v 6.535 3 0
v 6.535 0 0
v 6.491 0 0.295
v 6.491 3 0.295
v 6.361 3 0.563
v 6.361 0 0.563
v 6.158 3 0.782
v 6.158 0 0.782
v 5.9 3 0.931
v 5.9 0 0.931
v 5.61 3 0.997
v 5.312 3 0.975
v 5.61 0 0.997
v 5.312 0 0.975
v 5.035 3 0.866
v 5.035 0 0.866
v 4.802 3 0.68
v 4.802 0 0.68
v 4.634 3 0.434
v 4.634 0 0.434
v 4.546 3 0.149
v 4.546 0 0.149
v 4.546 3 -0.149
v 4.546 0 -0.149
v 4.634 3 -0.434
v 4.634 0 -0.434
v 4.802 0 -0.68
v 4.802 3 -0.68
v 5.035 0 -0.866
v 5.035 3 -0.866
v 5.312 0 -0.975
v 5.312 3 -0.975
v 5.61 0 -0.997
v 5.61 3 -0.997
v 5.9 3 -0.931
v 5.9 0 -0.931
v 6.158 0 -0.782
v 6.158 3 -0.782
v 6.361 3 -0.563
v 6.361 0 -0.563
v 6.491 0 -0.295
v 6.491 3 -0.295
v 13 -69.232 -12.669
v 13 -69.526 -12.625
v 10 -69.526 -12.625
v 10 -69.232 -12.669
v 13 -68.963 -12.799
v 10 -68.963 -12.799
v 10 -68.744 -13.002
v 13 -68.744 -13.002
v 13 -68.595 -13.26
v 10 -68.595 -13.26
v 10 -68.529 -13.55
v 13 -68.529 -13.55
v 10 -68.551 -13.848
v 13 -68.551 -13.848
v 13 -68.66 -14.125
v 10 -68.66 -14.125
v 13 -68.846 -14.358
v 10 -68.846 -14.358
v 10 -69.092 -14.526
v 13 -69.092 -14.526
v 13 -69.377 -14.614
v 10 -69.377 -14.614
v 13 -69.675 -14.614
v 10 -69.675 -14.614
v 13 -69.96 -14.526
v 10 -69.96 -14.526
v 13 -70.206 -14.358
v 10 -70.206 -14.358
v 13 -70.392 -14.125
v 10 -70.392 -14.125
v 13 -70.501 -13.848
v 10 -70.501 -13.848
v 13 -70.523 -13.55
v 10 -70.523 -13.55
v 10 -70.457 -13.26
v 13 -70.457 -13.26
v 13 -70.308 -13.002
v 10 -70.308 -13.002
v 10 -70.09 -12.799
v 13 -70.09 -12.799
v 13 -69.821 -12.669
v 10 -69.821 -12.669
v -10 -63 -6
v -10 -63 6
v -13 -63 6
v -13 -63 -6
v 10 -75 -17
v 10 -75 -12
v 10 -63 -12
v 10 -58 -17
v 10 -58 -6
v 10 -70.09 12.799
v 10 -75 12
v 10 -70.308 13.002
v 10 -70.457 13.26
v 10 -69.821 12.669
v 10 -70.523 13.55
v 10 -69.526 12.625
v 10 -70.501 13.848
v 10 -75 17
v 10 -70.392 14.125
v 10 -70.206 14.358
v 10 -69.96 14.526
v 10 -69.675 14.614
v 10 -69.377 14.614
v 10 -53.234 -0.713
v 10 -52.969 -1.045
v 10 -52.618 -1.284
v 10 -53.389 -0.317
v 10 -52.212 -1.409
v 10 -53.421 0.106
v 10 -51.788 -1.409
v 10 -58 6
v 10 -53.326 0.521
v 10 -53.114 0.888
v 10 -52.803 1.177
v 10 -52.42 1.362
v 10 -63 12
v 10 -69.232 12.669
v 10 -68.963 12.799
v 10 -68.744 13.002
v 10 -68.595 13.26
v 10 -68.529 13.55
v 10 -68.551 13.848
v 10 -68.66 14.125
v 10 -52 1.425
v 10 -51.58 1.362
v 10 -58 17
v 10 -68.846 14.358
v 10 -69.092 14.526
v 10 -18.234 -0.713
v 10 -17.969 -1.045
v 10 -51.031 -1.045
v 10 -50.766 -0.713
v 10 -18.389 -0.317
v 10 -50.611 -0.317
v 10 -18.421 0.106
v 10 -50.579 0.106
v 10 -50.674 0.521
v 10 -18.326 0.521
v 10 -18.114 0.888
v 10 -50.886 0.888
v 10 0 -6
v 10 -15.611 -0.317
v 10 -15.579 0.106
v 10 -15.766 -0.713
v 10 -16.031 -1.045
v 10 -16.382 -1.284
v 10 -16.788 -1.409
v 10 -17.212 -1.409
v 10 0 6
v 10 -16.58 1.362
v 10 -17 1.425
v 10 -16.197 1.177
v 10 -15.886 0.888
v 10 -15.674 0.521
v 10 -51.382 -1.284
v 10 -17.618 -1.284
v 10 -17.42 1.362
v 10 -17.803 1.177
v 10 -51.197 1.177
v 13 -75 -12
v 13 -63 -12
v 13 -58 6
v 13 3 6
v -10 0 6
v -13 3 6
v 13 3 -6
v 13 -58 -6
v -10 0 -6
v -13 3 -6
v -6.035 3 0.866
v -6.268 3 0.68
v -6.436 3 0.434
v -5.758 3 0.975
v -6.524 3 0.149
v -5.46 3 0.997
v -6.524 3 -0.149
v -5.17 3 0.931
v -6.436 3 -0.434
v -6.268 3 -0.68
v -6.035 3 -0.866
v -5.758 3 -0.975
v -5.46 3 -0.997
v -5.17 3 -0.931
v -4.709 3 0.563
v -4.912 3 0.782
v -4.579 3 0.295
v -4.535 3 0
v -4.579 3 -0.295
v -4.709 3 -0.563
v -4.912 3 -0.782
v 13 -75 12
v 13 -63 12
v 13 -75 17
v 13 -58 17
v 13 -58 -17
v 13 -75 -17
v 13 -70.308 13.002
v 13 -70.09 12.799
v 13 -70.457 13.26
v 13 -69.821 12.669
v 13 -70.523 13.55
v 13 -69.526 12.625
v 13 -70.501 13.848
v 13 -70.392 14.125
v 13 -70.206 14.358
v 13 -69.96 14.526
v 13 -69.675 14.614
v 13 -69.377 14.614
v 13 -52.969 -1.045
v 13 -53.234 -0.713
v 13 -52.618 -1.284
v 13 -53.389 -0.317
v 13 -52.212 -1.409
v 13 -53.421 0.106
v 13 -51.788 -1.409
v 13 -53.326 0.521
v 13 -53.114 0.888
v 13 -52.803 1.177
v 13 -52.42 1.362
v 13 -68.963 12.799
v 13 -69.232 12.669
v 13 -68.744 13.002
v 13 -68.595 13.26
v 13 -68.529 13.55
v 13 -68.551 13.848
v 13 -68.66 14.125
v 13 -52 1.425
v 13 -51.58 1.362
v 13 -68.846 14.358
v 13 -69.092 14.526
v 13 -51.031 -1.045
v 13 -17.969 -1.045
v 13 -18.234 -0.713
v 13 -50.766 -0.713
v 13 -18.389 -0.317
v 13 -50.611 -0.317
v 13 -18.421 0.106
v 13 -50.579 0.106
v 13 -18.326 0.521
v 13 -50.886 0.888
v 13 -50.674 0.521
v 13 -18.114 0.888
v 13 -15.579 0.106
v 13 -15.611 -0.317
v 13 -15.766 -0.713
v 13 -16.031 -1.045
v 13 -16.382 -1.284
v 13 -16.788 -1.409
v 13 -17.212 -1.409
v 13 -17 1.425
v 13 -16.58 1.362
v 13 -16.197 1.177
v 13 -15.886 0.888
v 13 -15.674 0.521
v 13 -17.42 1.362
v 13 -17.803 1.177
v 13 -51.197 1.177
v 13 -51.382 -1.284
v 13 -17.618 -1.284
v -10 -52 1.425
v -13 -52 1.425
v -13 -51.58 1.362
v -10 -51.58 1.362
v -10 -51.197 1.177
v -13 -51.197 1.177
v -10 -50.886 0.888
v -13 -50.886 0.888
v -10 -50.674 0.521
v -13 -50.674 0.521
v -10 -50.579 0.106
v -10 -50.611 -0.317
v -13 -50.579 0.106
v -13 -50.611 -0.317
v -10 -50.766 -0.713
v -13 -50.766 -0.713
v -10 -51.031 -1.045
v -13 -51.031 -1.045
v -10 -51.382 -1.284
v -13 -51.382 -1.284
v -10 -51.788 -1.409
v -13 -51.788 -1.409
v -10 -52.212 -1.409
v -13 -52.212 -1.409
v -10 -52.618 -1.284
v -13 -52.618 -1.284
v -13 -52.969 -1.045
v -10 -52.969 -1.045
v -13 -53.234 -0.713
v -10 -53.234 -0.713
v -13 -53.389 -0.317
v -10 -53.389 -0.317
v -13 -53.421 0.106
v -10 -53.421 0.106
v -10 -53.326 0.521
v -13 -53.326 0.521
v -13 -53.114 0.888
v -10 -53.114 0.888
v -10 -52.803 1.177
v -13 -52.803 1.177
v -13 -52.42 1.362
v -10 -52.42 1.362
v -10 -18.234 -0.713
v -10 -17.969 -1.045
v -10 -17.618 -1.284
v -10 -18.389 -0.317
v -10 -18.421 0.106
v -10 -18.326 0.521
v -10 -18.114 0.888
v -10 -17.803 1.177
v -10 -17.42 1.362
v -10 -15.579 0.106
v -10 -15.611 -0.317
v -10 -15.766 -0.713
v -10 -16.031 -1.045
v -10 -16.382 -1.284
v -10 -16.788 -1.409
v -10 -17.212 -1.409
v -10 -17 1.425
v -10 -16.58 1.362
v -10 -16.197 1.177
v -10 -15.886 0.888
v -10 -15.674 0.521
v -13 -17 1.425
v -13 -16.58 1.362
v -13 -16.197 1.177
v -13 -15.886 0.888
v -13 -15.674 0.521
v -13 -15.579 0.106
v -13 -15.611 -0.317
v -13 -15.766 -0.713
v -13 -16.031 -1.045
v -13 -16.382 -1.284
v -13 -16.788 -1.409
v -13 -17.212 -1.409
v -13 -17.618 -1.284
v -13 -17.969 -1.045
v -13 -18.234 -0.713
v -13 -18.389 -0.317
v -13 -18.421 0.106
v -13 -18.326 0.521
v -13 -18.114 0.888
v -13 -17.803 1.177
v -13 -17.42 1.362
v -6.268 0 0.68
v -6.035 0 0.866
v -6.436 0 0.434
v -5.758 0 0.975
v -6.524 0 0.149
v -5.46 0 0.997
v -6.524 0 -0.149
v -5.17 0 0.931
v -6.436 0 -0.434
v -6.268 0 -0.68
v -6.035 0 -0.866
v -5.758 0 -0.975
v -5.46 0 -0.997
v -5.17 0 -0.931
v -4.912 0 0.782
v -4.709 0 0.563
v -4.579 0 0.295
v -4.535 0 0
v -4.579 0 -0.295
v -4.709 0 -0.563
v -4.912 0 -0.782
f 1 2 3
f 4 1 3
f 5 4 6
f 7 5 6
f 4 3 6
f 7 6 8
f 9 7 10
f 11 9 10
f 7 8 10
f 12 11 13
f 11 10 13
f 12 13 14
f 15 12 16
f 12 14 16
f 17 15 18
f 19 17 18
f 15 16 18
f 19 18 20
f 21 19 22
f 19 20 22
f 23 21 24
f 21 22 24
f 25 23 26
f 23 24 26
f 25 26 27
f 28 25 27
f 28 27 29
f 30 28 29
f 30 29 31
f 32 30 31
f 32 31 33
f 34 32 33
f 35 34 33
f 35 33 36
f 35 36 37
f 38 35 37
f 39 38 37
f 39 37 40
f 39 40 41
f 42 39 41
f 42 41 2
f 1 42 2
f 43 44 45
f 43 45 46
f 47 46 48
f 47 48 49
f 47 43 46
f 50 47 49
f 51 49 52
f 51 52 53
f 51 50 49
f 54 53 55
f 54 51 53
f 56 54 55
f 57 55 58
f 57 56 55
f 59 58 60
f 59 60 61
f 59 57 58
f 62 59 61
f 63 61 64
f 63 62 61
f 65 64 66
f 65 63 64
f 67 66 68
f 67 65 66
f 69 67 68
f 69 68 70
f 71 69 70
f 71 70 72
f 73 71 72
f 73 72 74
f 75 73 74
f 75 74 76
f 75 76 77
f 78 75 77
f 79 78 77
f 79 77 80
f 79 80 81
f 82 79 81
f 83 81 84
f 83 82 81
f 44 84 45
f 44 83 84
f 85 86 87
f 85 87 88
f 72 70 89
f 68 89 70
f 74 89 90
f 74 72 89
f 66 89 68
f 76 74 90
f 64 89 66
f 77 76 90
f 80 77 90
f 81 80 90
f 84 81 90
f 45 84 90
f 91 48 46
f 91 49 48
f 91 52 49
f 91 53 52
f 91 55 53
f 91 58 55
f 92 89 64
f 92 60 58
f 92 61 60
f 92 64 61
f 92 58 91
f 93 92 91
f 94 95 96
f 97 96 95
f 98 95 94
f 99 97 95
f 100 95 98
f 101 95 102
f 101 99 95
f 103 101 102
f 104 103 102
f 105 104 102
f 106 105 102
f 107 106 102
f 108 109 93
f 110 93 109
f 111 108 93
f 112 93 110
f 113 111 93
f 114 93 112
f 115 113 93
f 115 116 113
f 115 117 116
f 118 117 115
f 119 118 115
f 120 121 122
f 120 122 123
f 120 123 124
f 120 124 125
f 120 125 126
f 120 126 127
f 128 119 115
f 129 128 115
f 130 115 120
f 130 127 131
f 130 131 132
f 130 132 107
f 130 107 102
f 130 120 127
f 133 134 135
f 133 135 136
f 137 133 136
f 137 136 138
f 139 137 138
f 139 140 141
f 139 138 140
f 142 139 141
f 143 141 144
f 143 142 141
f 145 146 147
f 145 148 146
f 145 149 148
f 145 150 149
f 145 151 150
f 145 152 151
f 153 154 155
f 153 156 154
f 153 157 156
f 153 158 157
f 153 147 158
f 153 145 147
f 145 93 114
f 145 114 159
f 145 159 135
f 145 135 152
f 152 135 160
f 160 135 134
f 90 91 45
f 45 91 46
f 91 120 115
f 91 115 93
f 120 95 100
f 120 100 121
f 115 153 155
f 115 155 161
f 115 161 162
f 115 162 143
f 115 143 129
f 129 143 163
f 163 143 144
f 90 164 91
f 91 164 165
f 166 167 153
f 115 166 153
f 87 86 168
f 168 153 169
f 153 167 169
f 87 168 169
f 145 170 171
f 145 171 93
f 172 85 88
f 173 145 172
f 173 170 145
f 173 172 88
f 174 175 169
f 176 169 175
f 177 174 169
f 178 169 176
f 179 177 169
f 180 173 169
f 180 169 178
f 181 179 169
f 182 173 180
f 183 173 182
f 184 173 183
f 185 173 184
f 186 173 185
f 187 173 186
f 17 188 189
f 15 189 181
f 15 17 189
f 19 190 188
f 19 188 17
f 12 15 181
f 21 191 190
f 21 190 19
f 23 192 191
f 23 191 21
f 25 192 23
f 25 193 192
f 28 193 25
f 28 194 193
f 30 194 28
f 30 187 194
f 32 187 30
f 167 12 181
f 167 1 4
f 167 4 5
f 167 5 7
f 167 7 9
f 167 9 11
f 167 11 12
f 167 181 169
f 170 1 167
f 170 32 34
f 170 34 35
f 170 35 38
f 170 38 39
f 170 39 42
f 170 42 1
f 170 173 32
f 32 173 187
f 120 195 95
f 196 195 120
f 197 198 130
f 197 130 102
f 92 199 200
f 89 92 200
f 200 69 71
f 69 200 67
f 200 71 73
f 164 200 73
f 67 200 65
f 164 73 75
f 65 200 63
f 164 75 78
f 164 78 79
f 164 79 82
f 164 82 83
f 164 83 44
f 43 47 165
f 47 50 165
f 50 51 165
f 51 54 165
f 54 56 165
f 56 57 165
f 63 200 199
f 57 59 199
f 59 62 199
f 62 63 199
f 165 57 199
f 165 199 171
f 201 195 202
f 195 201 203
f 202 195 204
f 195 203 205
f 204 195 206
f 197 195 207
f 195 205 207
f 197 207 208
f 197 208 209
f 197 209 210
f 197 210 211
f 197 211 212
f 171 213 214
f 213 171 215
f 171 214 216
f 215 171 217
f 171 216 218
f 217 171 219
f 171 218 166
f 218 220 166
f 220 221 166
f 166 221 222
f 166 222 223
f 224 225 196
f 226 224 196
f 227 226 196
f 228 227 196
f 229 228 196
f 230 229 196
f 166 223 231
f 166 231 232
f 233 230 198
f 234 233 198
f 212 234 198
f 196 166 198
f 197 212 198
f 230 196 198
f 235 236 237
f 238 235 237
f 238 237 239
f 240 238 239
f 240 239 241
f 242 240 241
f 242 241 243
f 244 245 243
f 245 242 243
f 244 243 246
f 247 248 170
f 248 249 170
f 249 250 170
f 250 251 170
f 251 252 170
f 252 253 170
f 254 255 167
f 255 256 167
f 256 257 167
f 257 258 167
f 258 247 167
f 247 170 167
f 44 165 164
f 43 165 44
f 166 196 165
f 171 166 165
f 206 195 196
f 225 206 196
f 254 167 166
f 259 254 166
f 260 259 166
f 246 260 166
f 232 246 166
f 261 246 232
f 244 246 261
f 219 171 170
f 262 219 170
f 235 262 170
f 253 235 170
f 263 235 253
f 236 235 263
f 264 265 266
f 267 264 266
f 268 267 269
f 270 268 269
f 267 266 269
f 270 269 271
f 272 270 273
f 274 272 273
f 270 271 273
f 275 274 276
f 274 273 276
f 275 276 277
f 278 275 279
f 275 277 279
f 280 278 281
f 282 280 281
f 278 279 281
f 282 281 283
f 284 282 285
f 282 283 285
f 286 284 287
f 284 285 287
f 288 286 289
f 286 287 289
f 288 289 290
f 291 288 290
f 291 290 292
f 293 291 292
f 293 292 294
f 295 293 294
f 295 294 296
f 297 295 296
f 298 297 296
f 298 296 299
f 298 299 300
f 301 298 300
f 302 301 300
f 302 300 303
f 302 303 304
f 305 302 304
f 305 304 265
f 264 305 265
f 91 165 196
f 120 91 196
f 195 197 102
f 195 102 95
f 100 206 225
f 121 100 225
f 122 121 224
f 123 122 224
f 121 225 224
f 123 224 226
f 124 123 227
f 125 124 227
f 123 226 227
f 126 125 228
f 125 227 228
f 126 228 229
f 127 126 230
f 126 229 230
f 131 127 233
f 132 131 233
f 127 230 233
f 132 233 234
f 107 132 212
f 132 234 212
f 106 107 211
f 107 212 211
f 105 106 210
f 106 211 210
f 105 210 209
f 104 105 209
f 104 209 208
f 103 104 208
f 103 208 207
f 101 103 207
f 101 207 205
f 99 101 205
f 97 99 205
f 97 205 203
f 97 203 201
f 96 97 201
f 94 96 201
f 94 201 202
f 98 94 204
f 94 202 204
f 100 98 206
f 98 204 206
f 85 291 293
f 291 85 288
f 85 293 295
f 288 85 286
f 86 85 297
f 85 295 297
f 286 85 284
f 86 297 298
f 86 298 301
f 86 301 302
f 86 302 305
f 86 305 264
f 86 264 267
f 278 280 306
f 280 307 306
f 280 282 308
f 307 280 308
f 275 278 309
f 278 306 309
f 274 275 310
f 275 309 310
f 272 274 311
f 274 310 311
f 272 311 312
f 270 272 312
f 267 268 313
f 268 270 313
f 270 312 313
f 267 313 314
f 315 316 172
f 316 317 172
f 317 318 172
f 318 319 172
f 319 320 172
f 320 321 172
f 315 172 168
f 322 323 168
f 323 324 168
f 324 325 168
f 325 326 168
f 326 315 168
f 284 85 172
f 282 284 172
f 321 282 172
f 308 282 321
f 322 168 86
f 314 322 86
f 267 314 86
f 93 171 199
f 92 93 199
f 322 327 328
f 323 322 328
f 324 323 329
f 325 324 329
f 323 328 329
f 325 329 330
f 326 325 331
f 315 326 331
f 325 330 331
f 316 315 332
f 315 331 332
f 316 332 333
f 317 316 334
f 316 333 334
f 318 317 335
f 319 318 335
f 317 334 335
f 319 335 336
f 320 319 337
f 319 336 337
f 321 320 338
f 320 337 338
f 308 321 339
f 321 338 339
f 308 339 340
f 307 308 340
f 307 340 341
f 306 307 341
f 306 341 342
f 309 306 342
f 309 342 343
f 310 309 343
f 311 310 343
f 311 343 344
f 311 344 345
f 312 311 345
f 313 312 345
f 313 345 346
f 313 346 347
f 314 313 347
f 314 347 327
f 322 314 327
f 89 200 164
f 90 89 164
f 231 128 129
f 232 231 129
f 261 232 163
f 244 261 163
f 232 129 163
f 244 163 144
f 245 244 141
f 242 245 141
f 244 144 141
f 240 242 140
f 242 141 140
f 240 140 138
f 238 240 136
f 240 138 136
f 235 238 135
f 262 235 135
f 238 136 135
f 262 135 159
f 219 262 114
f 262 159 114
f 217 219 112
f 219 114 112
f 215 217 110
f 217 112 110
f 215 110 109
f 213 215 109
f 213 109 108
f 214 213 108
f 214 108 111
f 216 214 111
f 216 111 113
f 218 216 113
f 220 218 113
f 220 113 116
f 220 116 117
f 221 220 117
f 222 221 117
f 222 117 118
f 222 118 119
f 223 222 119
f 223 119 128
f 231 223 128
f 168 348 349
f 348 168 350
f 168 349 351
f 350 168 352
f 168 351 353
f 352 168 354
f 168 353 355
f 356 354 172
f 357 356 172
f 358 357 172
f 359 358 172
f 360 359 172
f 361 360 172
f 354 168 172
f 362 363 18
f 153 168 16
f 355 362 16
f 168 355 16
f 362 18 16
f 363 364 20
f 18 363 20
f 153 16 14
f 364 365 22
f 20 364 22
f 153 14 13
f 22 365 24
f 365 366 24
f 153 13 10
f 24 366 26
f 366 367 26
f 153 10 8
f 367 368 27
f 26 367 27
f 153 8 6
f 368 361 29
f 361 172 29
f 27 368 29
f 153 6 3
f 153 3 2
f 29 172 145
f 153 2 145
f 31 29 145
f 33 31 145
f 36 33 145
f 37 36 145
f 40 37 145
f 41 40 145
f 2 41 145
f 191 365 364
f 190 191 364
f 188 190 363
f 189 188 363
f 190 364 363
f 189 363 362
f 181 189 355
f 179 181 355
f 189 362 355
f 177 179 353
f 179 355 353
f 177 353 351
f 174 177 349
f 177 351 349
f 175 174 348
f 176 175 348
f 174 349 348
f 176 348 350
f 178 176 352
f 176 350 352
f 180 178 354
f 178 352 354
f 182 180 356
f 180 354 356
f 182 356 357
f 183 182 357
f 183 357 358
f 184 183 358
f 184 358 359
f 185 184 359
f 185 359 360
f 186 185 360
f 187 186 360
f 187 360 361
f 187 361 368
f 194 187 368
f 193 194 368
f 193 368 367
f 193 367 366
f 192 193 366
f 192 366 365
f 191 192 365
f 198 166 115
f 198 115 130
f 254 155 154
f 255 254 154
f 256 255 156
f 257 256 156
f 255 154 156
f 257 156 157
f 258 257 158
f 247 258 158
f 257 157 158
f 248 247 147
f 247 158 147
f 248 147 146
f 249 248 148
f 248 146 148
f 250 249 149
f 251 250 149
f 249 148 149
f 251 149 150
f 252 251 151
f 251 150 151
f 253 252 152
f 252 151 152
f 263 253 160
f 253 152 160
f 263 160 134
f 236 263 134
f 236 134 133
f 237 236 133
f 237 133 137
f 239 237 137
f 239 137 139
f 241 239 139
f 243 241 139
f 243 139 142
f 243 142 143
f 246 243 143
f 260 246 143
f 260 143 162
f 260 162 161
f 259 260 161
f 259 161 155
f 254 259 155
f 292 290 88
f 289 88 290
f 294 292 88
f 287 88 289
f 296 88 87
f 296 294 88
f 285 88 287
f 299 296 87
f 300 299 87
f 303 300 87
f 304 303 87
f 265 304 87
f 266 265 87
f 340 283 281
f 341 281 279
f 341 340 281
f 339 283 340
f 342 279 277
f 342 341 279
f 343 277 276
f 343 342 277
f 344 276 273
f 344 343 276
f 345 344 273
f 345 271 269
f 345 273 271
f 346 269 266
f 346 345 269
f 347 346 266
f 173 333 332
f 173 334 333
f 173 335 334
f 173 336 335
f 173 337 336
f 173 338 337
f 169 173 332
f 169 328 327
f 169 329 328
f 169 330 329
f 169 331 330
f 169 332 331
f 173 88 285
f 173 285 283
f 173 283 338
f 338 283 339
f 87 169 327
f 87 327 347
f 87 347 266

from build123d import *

# Parameters (mm, degrees)
SKETCH2_W           = 26
SKETCH2_H           = 12
BOSS_EXTRUDE1_DEPTH = 3
SKETCH3_R           = 1
CUT_EXTRUDE1_DEPTH  = 10
SKETCH4_W           = 3
SKETCH4_H           = 12
BOSS_EXTRUDE2_DEPTH = 75
SKETCH5_R           = 1.425
CUT_EXTRUDE2_DEPTH  = 30
LPATTERN1_COUNT     = 2
LPATTERN1_PITCH     = 35
BOSS_EXTRUDE3_DEPTH = 3
SKETCH7_R           = 1
CUT_EXTRUDE3_DEPTH  = 3
SKETCH8_W           = 12
SKETCH8_H           = 12
CUT_EXTRUDE4_DEPTH  = 27


with BuildPart() as part:
    # Sketch2 → Boss-Extrude1 (new body)
    with BuildSketch(Plane(origin=(0, 0, 0), x_dir=(1, 0, 0), z_dir=(0, 1, 0))):
        Rectangle(SKETCH2_W, SKETCH2_H)
    extrude(amount=BOSS_EXTRUDE1_DEPTH)

    # Sketch3 → Cut-Extrude1 (cut)
    with BuildSketch(Plane.XZ):
        with Locations((-5.535, 0)):
            Circle(SKETCH3_R)
        with Locations((5.535, 0)):
            Circle(SKETCH3_R)
    extrude(amount=-CUT_EXTRUDE1_DEPTH, mode=Mode.SUBTRACT)

    # Sketch4 → Boss-Extrude2 (add)
    with BuildSketch(Plane.XZ):
        with Locations((-11.5, 0)):
            Rectangle(SKETCH4_W, SKETCH4_H)
    boss_extrude2 = extrude(amount=BOSS_EXTRUDE2_DEPTH)

    # Mirror1: Boss-Extrude2 across plane
    add(boss_extrude2.mirror(Plane(origin=(0, 0, 0), x_dir=(0, 0, 1), z_dir=(1, 0, 0))))

    # Sketch5 → Cut-Extrude2 (cut)
    with BuildSketch(Plane.ZY.offset(13)):
        with Locations((0, -17)):
            Circle(SKETCH5_R)
    cut_extrude2 = extrude(amount=-CUT_EXTRUDE2_DEPTH, mode=Mode.SUBTRACT)

    # LPattern1: Cut-Extrude2 ×2
    with Locations(*[(0, -i * LPATTERN1_PITCH, 0) for i in range(1, LPATTERN1_COUNT)]):
        add(cut_extrude2, mode=Mode.SUBTRACT)

    # Sketch6 → Boss-Extrude3 (add)
    with BuildSketch(Plane(origin=(13, 0, 0), x_dir=(0, 0, -1), z_dir=(1, 0, 0))):
        Polygon((-6, -58), (-17, -58), (-17, -63), (-17, -75), (-12, -75), (-12, -63), (-6, -63), align=None)
    boss_extrude3 = extrude(amount=-BOSS_EXTRUDE3_DEPTH)

    # Mirror2: Boss-Extrude3 across plane
    add(boss_extrude3.mirror(Plane.XY))

    # Sketch7 → Cut-Extrude3 (cut)
    with BuildSketch(Plane(origin=(13, 0, 0), x_dir=(0, 0, -1), z_dir=(1, 0, 0))):
        with Locations((-13.625, -69.526287367)):
            Circle(SKETCH7_R)
    cut_extrude3 = extrude(amount=-CUT_EXTRUDE3_DEPTH, mode=Mode.SUBTRACT)

    # Mirror3: Cut-Extrude3 across plane
    add(cut_extrude3.mirror(Plane.XY), mode=Mode.SUBTRACT)

    # Sketch8 → Cut-Extrude4 (cut, through all)
    with BuildSketch(Plane(origin=(13, 0, 0), x_dir=(0, 0, -1), z_dir=(1, 0, 0))):
        with Locations((0, -69)):
            Rectangle(SKETCH8_W, SKETCH8_H)
    extrude(amount=-CUT_EXTRUDE4_DEPTH, mode=Mode.SUBTRACT)


solid = part.part
